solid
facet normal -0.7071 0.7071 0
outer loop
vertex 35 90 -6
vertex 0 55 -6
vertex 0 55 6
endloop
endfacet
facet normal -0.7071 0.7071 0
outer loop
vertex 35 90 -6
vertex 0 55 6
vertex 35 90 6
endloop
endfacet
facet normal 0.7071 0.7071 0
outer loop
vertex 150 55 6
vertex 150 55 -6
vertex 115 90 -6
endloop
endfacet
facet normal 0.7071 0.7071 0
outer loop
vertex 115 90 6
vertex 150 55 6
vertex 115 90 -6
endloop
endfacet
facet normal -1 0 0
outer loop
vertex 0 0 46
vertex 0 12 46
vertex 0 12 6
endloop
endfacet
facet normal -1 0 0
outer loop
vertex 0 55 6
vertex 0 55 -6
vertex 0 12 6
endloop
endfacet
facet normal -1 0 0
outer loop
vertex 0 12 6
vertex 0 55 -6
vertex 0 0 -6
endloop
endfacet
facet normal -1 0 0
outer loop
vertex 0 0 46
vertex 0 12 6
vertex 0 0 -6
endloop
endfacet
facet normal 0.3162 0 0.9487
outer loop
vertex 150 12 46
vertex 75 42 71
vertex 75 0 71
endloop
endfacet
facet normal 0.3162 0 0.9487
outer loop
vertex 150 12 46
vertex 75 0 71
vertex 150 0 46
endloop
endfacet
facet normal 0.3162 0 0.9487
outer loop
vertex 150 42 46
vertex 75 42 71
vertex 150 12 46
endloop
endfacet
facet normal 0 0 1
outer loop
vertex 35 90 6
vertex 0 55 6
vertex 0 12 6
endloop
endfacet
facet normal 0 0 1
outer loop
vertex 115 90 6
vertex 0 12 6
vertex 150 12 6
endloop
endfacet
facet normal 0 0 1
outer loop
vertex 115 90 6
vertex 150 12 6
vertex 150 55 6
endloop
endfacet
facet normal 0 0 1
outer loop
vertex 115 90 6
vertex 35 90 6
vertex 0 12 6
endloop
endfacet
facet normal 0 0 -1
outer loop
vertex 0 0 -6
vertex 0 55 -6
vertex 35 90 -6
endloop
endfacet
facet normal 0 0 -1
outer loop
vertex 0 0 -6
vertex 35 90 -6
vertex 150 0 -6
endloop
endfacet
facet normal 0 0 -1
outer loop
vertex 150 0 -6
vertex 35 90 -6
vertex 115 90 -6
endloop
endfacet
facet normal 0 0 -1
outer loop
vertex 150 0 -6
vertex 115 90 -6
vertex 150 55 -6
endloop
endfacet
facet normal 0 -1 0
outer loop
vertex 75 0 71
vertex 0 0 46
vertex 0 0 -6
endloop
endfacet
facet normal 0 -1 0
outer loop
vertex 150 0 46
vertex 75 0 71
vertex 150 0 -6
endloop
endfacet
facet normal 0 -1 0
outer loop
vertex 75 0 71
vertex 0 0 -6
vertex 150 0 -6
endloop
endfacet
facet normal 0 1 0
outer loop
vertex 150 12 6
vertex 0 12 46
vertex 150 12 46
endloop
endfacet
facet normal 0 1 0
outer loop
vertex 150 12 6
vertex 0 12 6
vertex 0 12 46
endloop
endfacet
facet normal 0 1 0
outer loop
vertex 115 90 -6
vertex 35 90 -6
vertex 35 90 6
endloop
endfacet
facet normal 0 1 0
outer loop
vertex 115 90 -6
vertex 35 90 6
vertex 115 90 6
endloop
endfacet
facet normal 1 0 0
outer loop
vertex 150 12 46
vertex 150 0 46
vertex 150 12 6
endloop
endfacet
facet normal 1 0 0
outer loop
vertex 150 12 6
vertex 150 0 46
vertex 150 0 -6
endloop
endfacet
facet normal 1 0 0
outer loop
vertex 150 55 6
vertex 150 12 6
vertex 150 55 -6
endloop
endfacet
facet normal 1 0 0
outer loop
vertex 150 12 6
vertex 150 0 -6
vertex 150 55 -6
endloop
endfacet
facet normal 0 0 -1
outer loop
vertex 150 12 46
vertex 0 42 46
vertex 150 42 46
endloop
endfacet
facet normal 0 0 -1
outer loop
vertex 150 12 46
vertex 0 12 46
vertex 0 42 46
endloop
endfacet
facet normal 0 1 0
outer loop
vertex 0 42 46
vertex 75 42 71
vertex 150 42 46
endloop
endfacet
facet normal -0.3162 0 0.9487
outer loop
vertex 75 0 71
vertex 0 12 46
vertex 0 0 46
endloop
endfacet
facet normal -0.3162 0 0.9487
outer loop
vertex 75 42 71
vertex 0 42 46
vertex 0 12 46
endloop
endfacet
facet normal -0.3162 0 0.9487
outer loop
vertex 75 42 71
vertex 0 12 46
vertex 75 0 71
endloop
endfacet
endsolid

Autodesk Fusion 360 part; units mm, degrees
sketch "Sketch1" plane through (0, 0, 0) normal (0, 0, 1) x (1, 0, 0)
  line L0 (0, 0) -> (150, 0)
  line L1 (0, 0) -> (0, 55)
  line L2 (35, 90) -> (115, 90)
  line L3 (150, 55) -> (150, 0)
  line L4 (0, 55) -> (35, 90)
  line L5 (150, 55) -> (115, 90)
  point P0 (0, 90)
  point P1 (150, 90)
  dimension "d1" = 150
  dimension "d2" = 90
  dimension "d3" = 35
  dimension "d4" = 35
  dimension "d5" = 35
  dimension "d6" = 35
extrude "Extrude1" add sketch "Sketch1" along normal mid plane 12
sketch "Sketch2" plane through (0, 0, 6) normal (0, 0, 1) x (1, 0, 0)
  line L0 (0, 0) -> (150, 0)
  line L1 (150, 0) -> (150, 55)
  line L2 (150, 55) -> (115, 90)
  line L3 (115, 90) -> (35, 90)
  line L4 (35, 90) -> (0, 55)
  line L5 (0, 55) -> (0, 0)
  line L6 (0, 12) -> (150, 12)
  line L7 (150, 0) -> (0, 0)
  dimension "d9" = 12
extrude "Extrude2" add sketch "Sketch2" along normal blind 40 contours L0 L1 L5 L6 L7
sketch "Sketch3" plane through (0, 12, 0) normal (0, 1, 0) x (-1, 0, 0)
  line L0 (-150, 6) -> (0, 6)
  line L1 (0, 6) -> (0, 46)
  line L2 (0, 46) -> (-150, 46)
  line L3 (-150, 46) -> (-150, 6)
  line L4 (0, 46) -> (-75, 71)
  line L5 (-75, 71) -> (-150, 46)
  line L6 (-75, 11.1392) -> (-75, 80.8608)
  dimension "d12" = 25
  dimension "d13" = 25
extrude "Extrude3" add sketch "Sketch3" against normal blind 12 contours L2 L5 L6 | L2 L4 L6
sketch "Sketch4" plane through (0, 0, 6) normal (0, 0, 1) x (1, 0, 0)
  line L0 (0, 12) -> (150, 12)
  line L1 (150, 12) -> (150, 55)
  line L2 (150, 55) -> (115, 90)
  line L3 (115, 90) -> (35, 90)
  line L4 (35, 90) -> (0, 55)
  line L5 (0, 55) -> (0, 12)
sketch "Sketch5" plane through (0, 0, 0) normal (1, 0, 0) x (0, 0, -1)
extrude "Extrude4" add sketch "Sketch3" along normal blind 30 contours L2 L5 L6 | L2 L4 L6
